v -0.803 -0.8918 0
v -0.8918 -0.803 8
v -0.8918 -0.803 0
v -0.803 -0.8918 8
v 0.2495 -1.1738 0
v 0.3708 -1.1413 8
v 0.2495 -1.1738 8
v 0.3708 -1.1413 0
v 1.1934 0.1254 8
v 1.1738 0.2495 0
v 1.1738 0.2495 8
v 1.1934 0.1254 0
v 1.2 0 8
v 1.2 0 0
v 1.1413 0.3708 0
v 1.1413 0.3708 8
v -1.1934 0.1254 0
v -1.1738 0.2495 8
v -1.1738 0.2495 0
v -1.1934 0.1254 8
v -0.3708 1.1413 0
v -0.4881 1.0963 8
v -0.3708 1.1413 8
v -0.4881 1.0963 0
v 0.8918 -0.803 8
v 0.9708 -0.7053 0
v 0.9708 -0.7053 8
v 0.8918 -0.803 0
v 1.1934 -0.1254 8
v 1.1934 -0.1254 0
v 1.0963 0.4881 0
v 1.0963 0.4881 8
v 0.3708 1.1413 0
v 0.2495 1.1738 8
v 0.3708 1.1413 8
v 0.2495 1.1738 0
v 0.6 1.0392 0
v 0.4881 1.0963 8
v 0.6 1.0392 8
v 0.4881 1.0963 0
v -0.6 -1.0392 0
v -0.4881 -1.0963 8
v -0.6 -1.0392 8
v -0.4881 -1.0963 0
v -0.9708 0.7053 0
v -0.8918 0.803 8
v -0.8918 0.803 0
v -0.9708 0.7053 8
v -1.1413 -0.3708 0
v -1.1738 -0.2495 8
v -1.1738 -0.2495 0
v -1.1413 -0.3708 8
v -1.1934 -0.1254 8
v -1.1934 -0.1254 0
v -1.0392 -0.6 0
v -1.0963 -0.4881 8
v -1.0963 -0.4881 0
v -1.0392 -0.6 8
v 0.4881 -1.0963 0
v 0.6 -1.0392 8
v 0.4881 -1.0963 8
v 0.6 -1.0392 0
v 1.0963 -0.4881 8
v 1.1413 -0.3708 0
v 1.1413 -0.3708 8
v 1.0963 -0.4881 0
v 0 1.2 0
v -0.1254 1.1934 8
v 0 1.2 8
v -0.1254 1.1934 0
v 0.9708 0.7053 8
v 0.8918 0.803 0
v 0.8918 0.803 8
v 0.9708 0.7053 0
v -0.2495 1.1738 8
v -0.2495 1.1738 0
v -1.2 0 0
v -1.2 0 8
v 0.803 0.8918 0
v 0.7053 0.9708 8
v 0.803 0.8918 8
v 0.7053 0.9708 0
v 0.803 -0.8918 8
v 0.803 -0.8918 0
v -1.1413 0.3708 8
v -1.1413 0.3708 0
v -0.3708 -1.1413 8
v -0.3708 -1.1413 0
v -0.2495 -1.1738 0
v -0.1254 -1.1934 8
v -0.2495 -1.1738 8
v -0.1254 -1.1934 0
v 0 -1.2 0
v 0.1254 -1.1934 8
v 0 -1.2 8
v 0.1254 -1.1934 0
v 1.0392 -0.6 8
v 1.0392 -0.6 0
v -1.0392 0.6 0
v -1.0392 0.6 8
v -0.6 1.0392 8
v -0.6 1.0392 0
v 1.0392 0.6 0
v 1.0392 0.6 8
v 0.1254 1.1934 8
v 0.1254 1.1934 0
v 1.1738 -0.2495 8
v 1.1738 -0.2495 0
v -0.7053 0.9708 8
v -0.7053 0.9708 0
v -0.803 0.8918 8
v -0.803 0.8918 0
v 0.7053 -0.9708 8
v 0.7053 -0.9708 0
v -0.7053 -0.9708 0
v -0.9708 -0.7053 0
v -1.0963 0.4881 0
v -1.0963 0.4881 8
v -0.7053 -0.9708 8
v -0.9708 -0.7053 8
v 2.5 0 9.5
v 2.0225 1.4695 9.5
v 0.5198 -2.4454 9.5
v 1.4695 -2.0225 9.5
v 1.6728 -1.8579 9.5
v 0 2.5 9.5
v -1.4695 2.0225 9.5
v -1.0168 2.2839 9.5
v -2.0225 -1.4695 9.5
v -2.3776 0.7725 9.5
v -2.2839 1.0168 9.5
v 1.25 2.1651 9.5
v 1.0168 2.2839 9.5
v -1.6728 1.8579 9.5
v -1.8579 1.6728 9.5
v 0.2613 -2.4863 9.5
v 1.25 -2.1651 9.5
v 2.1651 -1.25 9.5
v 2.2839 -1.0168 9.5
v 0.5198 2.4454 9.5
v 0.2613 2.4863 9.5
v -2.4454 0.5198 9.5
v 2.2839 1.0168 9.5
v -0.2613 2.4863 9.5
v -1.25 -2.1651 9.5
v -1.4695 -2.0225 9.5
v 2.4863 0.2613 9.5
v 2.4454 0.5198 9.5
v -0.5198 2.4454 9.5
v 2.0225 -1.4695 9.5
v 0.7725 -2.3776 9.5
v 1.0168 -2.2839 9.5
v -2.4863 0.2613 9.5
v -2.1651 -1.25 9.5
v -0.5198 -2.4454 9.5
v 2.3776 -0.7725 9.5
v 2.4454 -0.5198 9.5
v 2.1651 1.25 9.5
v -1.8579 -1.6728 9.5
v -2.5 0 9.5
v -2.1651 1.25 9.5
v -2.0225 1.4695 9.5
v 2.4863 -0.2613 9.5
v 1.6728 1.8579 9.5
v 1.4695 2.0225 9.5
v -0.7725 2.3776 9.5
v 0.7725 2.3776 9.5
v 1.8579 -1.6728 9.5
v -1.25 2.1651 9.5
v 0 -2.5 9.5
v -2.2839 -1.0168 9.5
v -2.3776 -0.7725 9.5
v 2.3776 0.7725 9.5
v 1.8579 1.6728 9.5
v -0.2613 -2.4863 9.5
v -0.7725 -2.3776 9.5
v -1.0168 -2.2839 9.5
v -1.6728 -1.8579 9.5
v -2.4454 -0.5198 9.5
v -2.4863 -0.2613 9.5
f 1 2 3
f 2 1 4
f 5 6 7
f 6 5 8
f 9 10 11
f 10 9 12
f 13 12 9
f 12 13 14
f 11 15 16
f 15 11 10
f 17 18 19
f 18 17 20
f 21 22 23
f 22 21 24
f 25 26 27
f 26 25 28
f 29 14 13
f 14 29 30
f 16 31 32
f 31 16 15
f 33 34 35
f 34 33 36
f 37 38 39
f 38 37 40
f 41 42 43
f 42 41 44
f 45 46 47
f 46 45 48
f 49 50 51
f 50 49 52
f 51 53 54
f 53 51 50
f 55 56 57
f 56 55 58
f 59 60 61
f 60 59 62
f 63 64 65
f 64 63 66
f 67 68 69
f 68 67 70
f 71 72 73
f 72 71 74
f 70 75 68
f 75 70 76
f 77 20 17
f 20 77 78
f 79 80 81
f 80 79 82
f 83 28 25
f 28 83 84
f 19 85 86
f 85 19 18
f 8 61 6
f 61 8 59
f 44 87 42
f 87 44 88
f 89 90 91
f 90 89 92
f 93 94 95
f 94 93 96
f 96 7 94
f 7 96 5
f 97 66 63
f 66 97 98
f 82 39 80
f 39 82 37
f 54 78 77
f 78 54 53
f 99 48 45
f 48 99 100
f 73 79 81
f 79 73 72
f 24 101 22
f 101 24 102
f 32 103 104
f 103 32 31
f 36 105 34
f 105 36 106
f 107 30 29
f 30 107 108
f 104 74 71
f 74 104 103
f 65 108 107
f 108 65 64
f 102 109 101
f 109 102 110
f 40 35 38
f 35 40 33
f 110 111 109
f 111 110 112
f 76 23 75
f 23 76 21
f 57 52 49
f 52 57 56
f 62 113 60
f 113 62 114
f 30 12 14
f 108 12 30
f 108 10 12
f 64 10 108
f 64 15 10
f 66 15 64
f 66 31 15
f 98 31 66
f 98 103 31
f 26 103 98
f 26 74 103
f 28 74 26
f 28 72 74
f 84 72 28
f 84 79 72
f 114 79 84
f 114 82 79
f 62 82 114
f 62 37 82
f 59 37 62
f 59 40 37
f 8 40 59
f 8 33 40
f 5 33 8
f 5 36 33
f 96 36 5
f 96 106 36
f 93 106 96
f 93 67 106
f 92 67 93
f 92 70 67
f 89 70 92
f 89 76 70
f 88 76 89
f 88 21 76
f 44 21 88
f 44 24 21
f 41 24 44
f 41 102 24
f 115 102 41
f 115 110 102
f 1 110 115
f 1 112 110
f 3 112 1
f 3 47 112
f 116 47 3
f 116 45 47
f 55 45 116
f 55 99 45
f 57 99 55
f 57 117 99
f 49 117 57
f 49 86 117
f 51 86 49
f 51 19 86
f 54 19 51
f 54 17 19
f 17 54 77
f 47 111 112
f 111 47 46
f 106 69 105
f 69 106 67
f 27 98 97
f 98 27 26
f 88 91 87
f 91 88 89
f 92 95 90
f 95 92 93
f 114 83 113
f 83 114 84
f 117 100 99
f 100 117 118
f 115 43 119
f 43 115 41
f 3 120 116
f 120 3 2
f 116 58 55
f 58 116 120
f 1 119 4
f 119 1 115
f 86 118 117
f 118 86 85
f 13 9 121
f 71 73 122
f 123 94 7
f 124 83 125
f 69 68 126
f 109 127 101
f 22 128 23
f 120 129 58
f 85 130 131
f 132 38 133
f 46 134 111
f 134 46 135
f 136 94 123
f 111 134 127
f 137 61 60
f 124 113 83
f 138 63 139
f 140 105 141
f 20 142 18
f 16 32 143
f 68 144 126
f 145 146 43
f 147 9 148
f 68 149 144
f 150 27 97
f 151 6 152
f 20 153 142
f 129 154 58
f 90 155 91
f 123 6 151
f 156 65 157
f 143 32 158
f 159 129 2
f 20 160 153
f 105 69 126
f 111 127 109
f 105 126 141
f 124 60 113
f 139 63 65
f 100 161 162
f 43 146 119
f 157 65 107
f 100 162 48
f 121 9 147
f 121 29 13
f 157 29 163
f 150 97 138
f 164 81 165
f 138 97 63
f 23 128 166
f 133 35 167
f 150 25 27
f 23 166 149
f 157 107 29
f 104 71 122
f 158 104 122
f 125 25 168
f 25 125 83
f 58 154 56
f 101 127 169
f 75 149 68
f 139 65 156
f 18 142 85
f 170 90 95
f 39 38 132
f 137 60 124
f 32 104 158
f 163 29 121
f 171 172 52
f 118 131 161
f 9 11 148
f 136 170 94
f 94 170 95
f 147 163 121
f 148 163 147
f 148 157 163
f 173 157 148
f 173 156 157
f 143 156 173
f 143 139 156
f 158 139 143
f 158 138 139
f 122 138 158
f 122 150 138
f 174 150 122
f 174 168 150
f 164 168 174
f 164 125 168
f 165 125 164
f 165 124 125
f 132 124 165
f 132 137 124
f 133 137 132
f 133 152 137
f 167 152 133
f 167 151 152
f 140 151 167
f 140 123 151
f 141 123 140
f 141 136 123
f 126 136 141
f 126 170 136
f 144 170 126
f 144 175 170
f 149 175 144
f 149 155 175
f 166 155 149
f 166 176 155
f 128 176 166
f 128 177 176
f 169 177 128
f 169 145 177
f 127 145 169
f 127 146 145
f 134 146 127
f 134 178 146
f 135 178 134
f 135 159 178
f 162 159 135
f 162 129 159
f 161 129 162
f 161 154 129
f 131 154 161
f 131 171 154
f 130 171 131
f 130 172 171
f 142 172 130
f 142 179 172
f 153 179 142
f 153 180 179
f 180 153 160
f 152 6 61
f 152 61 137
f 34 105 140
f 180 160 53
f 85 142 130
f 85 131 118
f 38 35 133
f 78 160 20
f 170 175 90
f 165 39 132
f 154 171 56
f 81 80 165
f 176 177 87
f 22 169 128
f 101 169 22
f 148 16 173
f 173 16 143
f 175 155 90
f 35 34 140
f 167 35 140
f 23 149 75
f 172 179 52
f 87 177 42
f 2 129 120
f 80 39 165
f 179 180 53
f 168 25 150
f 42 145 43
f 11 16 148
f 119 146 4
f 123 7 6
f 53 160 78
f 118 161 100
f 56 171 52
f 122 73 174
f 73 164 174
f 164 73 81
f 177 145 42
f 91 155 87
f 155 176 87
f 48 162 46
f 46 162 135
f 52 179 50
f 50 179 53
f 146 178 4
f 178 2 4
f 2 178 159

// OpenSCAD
// Countersunk screw with 90-degree conical head.
$fn = 60;
eps = 0.02;
shaft_d = 2.4;
head_d = 5;
head_h = 1.5;
shaft_l = 8;
union() {
    cylinder(d = shaft_d, h = shaft_l);
    translate([0, 0, shaft_l]) cylinder(d1 = shaft_d, d2 = head_d, h = head_h);
}
